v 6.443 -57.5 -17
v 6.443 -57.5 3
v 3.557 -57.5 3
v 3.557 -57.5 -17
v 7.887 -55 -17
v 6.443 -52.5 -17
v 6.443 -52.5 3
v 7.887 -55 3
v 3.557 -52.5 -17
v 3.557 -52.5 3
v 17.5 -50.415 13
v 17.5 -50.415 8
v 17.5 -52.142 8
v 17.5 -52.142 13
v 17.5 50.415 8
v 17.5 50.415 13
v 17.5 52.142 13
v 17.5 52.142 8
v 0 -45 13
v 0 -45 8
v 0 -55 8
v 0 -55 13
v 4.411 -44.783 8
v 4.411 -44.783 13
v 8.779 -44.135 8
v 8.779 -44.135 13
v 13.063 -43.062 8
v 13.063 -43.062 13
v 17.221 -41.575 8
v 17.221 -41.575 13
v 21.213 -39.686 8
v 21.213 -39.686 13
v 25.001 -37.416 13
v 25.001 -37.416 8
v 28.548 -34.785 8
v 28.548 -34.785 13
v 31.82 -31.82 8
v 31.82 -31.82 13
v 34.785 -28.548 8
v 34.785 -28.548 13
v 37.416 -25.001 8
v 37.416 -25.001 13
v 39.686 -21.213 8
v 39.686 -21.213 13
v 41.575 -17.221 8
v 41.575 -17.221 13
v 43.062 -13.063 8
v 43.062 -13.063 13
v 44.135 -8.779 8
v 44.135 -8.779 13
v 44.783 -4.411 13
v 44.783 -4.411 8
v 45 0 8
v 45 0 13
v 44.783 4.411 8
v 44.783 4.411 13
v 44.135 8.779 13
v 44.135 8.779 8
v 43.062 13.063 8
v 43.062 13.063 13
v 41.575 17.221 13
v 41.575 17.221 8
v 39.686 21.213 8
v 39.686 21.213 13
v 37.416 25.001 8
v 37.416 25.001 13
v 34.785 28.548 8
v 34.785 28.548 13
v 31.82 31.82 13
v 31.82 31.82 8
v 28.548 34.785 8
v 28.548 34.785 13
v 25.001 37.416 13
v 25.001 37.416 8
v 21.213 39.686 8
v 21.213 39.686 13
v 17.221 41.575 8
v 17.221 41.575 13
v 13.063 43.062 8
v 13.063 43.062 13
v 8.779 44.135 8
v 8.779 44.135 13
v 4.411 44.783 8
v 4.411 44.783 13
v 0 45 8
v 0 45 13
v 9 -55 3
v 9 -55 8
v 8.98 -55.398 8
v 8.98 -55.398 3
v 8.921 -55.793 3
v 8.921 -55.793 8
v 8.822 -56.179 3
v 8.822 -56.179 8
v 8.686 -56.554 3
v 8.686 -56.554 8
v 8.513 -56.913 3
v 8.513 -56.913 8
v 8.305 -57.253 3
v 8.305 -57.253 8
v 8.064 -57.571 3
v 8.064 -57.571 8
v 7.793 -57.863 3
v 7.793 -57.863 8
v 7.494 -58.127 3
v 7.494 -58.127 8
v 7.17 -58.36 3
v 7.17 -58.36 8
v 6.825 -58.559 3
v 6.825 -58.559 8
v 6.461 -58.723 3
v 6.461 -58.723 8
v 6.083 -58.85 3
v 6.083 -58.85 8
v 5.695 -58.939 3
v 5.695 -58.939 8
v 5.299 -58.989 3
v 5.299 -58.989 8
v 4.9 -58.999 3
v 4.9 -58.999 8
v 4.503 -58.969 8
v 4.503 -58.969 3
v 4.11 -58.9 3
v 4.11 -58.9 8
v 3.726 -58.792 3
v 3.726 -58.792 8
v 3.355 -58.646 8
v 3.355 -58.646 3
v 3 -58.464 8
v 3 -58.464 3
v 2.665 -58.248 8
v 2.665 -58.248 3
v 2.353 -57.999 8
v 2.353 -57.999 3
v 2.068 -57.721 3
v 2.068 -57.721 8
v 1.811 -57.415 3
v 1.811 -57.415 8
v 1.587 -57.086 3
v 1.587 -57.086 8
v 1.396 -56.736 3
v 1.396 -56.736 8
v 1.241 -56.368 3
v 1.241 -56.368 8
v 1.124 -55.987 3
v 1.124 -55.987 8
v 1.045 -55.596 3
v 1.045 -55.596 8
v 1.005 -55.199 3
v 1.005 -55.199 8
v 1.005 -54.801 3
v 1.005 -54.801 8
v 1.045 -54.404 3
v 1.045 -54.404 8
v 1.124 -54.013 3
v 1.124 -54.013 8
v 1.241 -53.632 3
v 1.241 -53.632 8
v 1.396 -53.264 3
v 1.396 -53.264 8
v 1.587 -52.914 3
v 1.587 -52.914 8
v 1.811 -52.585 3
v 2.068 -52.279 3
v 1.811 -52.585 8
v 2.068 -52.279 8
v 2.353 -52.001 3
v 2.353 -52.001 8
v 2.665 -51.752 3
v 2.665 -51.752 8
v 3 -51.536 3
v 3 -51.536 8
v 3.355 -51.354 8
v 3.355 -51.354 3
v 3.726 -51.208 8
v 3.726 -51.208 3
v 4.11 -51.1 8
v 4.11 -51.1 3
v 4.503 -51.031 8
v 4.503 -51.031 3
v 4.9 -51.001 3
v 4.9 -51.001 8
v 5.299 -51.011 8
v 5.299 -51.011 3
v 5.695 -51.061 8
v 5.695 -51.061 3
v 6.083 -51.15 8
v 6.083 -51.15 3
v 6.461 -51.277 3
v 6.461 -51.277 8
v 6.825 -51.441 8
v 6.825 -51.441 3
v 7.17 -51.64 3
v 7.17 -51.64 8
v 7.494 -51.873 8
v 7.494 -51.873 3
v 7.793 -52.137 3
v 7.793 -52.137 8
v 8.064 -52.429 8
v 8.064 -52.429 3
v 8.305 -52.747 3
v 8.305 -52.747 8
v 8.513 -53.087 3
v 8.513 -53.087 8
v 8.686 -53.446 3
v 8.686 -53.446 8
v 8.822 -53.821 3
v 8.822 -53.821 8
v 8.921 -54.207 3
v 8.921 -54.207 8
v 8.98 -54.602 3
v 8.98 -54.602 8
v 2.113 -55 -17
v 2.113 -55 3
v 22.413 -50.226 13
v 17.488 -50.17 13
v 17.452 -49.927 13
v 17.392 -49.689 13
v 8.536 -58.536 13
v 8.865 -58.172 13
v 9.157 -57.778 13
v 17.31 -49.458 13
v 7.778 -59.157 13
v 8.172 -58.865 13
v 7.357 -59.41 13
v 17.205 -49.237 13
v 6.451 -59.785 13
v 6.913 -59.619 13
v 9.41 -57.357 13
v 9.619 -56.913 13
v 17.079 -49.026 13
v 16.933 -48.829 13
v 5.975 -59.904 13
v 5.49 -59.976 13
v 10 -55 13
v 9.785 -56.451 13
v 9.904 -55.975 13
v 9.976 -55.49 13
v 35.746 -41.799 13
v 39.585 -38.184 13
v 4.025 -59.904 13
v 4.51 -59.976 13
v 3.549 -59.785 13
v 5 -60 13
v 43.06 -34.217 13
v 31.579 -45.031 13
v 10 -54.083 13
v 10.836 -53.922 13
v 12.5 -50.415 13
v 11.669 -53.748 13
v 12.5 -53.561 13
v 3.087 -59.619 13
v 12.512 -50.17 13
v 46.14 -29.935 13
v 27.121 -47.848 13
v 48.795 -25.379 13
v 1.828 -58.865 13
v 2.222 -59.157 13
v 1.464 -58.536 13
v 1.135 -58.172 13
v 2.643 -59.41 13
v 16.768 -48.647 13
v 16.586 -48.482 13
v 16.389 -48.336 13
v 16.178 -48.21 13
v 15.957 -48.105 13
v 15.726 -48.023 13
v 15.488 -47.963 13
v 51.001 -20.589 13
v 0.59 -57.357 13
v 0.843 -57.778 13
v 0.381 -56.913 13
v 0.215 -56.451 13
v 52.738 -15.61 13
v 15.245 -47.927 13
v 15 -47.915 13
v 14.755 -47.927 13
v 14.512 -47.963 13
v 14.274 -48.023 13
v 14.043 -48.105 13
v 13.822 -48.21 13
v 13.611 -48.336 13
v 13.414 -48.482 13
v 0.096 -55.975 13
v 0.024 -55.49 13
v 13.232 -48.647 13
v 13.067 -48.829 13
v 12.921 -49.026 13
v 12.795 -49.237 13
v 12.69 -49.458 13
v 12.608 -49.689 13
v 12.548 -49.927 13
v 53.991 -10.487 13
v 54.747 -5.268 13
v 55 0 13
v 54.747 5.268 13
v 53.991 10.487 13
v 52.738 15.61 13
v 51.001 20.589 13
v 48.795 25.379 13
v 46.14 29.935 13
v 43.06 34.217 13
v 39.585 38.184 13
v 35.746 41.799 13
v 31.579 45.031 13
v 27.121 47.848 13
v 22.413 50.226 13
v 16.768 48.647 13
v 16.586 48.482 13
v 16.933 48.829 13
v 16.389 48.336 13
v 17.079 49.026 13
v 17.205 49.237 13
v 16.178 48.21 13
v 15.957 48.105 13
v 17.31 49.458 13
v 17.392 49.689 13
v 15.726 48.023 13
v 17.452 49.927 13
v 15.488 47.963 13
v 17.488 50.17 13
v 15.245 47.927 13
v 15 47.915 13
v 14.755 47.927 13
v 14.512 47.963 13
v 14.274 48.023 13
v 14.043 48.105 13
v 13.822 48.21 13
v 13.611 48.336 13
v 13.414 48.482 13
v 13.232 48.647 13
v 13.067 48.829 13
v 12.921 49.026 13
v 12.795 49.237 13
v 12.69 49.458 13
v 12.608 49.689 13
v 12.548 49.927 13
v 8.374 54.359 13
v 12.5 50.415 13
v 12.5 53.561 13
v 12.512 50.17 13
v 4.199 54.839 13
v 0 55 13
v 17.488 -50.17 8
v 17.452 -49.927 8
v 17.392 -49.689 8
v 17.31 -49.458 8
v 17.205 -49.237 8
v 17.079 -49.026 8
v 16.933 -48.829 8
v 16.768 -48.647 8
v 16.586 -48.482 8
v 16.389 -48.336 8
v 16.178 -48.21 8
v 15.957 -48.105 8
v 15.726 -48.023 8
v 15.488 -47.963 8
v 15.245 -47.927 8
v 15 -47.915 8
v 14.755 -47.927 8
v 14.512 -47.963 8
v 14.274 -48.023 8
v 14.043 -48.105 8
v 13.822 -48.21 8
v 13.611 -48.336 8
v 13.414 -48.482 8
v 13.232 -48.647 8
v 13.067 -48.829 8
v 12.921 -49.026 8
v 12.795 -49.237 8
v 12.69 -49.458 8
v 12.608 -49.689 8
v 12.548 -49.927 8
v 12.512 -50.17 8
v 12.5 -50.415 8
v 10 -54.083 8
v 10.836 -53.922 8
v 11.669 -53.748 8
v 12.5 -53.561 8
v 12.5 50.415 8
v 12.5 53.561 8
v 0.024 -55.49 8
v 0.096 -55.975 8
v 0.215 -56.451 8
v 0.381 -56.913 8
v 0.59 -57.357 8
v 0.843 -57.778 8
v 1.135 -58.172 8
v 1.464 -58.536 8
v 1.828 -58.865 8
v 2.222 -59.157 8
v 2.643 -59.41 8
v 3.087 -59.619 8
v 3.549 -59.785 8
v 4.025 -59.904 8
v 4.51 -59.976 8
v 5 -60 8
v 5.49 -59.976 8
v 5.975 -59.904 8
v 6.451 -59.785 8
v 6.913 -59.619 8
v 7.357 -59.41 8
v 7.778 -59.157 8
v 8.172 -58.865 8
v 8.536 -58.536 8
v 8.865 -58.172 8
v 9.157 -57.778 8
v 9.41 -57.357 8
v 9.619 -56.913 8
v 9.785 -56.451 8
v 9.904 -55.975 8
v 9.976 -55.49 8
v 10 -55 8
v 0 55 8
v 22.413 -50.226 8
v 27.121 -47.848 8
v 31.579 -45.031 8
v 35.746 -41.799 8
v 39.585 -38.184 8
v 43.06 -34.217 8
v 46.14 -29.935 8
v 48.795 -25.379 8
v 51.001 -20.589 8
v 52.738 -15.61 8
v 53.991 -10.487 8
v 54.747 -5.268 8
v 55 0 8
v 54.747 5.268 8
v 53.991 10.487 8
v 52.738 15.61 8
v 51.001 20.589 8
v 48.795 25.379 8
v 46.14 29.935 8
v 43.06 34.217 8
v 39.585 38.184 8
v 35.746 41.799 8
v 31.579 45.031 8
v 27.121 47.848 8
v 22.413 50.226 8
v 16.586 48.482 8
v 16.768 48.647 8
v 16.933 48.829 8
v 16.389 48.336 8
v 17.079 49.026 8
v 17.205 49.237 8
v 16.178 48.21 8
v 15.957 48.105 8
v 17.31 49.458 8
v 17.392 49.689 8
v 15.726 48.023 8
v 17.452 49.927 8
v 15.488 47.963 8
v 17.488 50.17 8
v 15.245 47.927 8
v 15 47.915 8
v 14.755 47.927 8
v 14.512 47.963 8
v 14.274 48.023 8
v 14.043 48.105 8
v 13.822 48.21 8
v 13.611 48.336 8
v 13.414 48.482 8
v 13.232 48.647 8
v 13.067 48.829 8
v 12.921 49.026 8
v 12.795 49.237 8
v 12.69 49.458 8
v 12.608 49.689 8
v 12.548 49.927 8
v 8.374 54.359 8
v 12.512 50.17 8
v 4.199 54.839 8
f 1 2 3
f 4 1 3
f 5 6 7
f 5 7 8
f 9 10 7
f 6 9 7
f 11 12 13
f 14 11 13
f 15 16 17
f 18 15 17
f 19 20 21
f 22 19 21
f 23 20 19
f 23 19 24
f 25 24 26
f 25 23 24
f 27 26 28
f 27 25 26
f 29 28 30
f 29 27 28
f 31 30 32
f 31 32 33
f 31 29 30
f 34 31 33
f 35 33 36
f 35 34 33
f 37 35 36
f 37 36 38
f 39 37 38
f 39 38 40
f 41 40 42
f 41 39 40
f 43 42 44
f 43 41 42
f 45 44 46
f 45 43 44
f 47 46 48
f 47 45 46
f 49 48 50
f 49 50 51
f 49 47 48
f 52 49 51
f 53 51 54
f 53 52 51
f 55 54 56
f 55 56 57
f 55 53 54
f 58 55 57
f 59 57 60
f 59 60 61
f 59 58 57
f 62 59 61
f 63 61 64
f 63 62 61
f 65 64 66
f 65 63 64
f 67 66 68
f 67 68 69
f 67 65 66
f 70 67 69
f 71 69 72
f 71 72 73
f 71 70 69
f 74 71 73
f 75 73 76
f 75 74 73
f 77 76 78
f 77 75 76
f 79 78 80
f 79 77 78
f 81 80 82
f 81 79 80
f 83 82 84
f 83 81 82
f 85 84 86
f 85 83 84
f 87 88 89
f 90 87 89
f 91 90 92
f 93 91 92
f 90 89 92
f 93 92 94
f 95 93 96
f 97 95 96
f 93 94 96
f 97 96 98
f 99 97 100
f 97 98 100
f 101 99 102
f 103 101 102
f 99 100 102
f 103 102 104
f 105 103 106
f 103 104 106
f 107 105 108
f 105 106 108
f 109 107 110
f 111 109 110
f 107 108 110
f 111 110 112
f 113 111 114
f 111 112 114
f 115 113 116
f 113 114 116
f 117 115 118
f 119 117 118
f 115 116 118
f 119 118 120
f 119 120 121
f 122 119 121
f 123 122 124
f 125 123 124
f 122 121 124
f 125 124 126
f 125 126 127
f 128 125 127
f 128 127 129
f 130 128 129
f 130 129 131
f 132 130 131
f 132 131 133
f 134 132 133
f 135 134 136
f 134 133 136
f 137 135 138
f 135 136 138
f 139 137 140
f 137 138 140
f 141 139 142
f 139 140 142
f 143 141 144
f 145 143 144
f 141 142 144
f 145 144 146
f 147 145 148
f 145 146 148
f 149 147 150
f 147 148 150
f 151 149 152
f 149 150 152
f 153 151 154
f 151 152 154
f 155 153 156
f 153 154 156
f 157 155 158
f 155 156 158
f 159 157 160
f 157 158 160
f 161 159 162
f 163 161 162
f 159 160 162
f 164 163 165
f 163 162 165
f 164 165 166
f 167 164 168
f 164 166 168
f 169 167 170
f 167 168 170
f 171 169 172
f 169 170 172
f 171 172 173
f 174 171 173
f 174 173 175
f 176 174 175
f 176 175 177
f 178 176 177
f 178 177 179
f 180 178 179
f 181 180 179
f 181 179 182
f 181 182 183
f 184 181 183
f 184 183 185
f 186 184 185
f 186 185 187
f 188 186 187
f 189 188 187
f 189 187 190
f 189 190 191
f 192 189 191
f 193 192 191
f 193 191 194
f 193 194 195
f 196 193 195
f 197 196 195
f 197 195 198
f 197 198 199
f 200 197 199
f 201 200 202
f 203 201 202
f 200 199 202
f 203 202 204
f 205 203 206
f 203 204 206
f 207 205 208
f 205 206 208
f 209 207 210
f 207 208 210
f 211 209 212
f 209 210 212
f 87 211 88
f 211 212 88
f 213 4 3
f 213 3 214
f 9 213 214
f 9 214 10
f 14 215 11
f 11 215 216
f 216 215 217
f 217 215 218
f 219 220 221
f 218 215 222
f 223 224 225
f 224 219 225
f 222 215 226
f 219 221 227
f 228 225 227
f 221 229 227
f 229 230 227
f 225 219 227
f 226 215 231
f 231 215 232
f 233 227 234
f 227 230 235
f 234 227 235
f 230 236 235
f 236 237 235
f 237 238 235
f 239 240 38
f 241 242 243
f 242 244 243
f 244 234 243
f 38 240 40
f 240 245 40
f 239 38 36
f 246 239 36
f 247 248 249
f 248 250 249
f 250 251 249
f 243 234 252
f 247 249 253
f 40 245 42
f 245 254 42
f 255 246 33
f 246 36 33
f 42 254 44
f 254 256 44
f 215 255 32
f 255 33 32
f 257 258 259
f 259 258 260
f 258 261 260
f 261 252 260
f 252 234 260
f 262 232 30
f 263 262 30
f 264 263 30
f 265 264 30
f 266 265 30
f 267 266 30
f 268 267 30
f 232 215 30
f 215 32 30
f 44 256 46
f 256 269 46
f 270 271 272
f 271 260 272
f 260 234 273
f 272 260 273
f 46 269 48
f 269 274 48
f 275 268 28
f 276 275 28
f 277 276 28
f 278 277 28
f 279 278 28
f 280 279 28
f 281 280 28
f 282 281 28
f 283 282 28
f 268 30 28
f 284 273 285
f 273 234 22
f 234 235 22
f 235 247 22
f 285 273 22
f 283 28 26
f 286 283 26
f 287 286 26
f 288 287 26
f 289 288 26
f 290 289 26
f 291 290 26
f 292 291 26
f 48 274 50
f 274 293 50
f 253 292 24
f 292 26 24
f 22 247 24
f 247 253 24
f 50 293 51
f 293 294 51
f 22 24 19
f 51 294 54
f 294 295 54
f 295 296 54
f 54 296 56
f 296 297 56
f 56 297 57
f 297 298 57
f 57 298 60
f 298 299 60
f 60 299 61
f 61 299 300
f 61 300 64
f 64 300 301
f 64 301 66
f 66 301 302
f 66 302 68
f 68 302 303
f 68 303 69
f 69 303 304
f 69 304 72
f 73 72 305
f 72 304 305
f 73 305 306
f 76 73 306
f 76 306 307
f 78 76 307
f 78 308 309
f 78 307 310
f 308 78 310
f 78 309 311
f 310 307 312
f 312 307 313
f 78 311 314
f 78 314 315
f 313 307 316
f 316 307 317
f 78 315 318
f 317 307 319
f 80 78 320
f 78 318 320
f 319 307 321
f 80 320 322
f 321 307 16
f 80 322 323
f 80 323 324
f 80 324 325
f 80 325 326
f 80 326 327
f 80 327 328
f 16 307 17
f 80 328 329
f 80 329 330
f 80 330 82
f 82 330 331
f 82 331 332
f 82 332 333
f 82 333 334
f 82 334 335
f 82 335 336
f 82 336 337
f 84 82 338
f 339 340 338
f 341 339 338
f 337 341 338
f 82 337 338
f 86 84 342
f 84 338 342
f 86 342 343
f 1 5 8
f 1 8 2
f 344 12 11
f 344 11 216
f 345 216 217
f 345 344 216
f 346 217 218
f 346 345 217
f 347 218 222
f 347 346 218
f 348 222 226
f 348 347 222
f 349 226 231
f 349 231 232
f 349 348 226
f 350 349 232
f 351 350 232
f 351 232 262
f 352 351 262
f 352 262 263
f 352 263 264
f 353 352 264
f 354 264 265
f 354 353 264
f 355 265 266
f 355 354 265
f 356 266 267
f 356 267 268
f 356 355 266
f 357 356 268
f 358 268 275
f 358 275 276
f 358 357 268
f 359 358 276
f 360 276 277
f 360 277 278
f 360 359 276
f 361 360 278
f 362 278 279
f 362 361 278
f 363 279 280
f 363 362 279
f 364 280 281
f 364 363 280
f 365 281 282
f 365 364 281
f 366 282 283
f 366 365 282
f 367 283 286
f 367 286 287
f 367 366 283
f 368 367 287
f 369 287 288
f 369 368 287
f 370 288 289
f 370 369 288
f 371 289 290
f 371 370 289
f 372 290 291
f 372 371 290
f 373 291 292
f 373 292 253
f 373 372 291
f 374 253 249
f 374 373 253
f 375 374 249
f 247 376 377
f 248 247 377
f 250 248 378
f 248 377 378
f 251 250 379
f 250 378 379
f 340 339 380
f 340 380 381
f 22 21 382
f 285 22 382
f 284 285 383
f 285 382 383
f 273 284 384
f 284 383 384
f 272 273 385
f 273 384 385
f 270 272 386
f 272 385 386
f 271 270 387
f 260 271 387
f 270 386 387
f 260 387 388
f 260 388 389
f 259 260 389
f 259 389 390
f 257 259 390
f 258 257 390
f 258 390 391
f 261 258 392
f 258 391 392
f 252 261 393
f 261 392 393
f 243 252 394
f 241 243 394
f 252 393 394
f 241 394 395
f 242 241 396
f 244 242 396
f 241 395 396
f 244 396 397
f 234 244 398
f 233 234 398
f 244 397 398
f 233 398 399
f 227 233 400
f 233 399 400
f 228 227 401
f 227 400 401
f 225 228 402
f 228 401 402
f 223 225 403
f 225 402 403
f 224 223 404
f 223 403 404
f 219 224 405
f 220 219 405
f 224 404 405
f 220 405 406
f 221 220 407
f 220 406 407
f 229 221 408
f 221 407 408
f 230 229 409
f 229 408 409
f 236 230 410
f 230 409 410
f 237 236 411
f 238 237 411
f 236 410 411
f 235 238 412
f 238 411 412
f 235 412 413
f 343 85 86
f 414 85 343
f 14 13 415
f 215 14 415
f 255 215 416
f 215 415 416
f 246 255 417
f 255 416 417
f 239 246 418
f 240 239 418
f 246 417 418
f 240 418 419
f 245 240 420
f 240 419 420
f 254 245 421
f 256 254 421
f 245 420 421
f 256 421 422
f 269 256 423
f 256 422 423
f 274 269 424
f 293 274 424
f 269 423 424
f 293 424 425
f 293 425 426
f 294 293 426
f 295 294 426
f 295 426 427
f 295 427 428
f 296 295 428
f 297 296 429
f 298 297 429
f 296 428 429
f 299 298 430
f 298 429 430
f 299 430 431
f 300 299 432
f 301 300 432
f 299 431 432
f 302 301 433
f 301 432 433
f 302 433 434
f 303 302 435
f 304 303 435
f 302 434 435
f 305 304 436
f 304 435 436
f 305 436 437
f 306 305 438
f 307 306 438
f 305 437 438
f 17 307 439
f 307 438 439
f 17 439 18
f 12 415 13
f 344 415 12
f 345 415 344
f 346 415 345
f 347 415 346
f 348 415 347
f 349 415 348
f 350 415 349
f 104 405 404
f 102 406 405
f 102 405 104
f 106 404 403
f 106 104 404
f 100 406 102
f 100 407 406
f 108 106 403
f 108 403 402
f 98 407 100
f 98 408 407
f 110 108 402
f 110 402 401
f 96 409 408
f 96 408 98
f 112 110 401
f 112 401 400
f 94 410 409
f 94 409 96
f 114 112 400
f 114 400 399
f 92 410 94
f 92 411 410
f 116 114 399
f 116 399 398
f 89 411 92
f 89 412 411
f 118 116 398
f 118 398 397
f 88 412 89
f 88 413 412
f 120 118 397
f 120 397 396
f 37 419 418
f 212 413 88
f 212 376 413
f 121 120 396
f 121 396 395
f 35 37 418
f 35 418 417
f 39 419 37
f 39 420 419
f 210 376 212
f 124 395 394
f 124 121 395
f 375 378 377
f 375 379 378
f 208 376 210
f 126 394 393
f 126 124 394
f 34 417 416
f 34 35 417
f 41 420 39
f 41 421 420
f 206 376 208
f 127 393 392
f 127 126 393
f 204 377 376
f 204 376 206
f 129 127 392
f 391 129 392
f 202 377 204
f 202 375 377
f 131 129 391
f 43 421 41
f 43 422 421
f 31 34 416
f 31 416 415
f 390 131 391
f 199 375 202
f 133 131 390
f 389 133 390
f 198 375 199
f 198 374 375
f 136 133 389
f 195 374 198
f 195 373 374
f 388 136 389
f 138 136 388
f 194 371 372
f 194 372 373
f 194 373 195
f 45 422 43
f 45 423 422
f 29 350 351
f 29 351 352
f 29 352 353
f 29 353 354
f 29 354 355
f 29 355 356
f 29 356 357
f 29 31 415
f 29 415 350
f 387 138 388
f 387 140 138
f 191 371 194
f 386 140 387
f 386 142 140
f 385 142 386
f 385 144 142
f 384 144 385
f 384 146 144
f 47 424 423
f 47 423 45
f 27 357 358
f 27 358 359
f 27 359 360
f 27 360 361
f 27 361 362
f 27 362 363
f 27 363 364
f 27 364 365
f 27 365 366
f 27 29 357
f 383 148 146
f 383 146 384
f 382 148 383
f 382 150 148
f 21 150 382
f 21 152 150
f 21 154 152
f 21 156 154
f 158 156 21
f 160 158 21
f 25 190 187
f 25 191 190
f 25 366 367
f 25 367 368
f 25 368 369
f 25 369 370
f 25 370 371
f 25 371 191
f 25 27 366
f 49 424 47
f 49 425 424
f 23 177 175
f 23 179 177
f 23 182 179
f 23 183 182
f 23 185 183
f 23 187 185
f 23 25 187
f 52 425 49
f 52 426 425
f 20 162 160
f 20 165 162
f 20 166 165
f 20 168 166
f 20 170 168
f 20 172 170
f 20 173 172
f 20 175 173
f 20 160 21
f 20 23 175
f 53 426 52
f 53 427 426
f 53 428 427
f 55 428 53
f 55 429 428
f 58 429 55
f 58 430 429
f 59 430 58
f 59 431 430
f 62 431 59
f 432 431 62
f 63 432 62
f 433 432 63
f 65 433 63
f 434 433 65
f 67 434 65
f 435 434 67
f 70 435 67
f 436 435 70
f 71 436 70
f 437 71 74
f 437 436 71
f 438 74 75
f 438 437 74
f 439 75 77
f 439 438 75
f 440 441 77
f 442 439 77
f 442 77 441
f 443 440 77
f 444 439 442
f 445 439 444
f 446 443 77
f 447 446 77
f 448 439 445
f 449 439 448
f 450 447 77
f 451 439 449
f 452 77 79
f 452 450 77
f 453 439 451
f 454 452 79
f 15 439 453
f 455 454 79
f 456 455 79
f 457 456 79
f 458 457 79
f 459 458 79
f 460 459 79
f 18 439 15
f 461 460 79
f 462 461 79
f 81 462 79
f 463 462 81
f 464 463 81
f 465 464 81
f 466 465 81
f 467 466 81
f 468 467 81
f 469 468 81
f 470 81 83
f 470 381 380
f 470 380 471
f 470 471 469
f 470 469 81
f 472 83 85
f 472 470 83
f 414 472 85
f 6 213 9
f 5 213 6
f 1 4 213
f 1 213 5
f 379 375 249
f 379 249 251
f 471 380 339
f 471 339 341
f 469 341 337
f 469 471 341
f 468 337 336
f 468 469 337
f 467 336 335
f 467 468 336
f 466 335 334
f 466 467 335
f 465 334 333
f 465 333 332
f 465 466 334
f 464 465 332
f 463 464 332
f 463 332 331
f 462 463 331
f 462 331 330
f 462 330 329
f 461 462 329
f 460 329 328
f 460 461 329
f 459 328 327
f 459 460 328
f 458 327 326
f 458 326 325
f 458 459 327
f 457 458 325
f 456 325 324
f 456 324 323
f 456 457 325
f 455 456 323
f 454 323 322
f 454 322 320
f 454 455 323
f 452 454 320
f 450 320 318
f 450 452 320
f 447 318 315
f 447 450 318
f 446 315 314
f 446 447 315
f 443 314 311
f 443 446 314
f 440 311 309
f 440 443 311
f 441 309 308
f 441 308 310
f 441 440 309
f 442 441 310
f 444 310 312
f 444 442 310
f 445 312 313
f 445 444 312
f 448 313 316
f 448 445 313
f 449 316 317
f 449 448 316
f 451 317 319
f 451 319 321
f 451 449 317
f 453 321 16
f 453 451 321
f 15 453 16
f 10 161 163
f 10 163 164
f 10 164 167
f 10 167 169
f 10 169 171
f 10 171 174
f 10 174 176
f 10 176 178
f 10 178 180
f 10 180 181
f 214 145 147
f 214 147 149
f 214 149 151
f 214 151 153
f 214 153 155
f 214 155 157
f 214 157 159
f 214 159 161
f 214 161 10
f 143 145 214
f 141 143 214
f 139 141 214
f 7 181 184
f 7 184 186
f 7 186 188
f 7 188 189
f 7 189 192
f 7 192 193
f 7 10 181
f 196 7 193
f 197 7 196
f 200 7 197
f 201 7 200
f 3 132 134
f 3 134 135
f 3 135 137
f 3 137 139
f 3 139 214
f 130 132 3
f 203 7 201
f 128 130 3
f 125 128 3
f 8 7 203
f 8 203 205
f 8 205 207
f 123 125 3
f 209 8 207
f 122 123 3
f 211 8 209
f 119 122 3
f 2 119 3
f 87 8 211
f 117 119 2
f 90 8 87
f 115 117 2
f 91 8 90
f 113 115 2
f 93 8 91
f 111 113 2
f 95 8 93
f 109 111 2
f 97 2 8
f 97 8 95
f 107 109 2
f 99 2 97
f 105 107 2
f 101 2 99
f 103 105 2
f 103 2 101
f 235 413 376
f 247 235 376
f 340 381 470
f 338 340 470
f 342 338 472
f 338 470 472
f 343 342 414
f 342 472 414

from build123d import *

# Parameters (mm, degrees)
PAD002_DEPTH = 5
SKETCH006_R  = 4
PAD003_DEPTH = 5
PAD009_DEPTH = 20


with BuildPart() as part:
    # Sketch003 → Pad002 (new body)
    with BuildSketch(Plane.XY):
        with BuildLine():
            ThreePointArc((0, -45), (45, 0), (0, 45))
            Line((0, 45), (0, 55))
            ThreePointArc((12.5, 53.560713), (6.291295, 54.638994), (0, 55))
            Line((12.5, 50.415026), (12.5, 53.560713))
            ThreePointArc((12.5, 50.415026), (15, 47.915026), (17.5, 50.415026))
            Line((17.5, 50.415026), (17.5, 52.141634))
            ThreePointArc((17.5, -52.141634), (55, 0), (17.5, 52.141634))
            Line((17.5, -50.415026), (17.5, -52.141634))
            ThreePointArc((17.5, -50.415026), (15, -47.915026), (12.5, -50.415026))
            Line((12.5, -50.415026), (12.5, -53.560713))
            ThreePointArc((10, -54.083269), (11.253034, -53.836505), (12.5, -53.560713))
            Line((10, -55), (10, -54.083269))
            ThreePointArc((0, -55), (5, -60), (10, -55))
            Line((0, -45), (0, -55))
        make_face()
    extrude(amount=PAD002_DEPTH)

    # Sketch006 (on Face15 of Pad002) → Pad003 (join)
    with BuildSketch(Plane(origin=(0, 0, 0), x_dir=(1, 0, 0), z_dir=(0, 0, -1))):
        with Locations((5, 55)):
            Circle(SKETCH006_R)
    extrude(amount=PAD003_DEPTH)

    # Sketch009 (on Face18 of Pad003) → Pad009 (join)
    with BuildSketch(Plane(origin=(0, 0, -5), x_dir=(1, 0, 0), z_dir=(0, 0, -1))):
        Polygon((2.113249, 55), (3.556624, 52.5), (6.443376, 52.5), (7.886751, 55), (6.443376, 57.5), (3.556624, 57.5), align=None)
    extrude(amount=PAD009_DEPTH)


with BuildPart() as part_1:
    # Body001 placement: moved
    add(part.part.moved(Location((0, 0, 8))))


solid = part_1.part
